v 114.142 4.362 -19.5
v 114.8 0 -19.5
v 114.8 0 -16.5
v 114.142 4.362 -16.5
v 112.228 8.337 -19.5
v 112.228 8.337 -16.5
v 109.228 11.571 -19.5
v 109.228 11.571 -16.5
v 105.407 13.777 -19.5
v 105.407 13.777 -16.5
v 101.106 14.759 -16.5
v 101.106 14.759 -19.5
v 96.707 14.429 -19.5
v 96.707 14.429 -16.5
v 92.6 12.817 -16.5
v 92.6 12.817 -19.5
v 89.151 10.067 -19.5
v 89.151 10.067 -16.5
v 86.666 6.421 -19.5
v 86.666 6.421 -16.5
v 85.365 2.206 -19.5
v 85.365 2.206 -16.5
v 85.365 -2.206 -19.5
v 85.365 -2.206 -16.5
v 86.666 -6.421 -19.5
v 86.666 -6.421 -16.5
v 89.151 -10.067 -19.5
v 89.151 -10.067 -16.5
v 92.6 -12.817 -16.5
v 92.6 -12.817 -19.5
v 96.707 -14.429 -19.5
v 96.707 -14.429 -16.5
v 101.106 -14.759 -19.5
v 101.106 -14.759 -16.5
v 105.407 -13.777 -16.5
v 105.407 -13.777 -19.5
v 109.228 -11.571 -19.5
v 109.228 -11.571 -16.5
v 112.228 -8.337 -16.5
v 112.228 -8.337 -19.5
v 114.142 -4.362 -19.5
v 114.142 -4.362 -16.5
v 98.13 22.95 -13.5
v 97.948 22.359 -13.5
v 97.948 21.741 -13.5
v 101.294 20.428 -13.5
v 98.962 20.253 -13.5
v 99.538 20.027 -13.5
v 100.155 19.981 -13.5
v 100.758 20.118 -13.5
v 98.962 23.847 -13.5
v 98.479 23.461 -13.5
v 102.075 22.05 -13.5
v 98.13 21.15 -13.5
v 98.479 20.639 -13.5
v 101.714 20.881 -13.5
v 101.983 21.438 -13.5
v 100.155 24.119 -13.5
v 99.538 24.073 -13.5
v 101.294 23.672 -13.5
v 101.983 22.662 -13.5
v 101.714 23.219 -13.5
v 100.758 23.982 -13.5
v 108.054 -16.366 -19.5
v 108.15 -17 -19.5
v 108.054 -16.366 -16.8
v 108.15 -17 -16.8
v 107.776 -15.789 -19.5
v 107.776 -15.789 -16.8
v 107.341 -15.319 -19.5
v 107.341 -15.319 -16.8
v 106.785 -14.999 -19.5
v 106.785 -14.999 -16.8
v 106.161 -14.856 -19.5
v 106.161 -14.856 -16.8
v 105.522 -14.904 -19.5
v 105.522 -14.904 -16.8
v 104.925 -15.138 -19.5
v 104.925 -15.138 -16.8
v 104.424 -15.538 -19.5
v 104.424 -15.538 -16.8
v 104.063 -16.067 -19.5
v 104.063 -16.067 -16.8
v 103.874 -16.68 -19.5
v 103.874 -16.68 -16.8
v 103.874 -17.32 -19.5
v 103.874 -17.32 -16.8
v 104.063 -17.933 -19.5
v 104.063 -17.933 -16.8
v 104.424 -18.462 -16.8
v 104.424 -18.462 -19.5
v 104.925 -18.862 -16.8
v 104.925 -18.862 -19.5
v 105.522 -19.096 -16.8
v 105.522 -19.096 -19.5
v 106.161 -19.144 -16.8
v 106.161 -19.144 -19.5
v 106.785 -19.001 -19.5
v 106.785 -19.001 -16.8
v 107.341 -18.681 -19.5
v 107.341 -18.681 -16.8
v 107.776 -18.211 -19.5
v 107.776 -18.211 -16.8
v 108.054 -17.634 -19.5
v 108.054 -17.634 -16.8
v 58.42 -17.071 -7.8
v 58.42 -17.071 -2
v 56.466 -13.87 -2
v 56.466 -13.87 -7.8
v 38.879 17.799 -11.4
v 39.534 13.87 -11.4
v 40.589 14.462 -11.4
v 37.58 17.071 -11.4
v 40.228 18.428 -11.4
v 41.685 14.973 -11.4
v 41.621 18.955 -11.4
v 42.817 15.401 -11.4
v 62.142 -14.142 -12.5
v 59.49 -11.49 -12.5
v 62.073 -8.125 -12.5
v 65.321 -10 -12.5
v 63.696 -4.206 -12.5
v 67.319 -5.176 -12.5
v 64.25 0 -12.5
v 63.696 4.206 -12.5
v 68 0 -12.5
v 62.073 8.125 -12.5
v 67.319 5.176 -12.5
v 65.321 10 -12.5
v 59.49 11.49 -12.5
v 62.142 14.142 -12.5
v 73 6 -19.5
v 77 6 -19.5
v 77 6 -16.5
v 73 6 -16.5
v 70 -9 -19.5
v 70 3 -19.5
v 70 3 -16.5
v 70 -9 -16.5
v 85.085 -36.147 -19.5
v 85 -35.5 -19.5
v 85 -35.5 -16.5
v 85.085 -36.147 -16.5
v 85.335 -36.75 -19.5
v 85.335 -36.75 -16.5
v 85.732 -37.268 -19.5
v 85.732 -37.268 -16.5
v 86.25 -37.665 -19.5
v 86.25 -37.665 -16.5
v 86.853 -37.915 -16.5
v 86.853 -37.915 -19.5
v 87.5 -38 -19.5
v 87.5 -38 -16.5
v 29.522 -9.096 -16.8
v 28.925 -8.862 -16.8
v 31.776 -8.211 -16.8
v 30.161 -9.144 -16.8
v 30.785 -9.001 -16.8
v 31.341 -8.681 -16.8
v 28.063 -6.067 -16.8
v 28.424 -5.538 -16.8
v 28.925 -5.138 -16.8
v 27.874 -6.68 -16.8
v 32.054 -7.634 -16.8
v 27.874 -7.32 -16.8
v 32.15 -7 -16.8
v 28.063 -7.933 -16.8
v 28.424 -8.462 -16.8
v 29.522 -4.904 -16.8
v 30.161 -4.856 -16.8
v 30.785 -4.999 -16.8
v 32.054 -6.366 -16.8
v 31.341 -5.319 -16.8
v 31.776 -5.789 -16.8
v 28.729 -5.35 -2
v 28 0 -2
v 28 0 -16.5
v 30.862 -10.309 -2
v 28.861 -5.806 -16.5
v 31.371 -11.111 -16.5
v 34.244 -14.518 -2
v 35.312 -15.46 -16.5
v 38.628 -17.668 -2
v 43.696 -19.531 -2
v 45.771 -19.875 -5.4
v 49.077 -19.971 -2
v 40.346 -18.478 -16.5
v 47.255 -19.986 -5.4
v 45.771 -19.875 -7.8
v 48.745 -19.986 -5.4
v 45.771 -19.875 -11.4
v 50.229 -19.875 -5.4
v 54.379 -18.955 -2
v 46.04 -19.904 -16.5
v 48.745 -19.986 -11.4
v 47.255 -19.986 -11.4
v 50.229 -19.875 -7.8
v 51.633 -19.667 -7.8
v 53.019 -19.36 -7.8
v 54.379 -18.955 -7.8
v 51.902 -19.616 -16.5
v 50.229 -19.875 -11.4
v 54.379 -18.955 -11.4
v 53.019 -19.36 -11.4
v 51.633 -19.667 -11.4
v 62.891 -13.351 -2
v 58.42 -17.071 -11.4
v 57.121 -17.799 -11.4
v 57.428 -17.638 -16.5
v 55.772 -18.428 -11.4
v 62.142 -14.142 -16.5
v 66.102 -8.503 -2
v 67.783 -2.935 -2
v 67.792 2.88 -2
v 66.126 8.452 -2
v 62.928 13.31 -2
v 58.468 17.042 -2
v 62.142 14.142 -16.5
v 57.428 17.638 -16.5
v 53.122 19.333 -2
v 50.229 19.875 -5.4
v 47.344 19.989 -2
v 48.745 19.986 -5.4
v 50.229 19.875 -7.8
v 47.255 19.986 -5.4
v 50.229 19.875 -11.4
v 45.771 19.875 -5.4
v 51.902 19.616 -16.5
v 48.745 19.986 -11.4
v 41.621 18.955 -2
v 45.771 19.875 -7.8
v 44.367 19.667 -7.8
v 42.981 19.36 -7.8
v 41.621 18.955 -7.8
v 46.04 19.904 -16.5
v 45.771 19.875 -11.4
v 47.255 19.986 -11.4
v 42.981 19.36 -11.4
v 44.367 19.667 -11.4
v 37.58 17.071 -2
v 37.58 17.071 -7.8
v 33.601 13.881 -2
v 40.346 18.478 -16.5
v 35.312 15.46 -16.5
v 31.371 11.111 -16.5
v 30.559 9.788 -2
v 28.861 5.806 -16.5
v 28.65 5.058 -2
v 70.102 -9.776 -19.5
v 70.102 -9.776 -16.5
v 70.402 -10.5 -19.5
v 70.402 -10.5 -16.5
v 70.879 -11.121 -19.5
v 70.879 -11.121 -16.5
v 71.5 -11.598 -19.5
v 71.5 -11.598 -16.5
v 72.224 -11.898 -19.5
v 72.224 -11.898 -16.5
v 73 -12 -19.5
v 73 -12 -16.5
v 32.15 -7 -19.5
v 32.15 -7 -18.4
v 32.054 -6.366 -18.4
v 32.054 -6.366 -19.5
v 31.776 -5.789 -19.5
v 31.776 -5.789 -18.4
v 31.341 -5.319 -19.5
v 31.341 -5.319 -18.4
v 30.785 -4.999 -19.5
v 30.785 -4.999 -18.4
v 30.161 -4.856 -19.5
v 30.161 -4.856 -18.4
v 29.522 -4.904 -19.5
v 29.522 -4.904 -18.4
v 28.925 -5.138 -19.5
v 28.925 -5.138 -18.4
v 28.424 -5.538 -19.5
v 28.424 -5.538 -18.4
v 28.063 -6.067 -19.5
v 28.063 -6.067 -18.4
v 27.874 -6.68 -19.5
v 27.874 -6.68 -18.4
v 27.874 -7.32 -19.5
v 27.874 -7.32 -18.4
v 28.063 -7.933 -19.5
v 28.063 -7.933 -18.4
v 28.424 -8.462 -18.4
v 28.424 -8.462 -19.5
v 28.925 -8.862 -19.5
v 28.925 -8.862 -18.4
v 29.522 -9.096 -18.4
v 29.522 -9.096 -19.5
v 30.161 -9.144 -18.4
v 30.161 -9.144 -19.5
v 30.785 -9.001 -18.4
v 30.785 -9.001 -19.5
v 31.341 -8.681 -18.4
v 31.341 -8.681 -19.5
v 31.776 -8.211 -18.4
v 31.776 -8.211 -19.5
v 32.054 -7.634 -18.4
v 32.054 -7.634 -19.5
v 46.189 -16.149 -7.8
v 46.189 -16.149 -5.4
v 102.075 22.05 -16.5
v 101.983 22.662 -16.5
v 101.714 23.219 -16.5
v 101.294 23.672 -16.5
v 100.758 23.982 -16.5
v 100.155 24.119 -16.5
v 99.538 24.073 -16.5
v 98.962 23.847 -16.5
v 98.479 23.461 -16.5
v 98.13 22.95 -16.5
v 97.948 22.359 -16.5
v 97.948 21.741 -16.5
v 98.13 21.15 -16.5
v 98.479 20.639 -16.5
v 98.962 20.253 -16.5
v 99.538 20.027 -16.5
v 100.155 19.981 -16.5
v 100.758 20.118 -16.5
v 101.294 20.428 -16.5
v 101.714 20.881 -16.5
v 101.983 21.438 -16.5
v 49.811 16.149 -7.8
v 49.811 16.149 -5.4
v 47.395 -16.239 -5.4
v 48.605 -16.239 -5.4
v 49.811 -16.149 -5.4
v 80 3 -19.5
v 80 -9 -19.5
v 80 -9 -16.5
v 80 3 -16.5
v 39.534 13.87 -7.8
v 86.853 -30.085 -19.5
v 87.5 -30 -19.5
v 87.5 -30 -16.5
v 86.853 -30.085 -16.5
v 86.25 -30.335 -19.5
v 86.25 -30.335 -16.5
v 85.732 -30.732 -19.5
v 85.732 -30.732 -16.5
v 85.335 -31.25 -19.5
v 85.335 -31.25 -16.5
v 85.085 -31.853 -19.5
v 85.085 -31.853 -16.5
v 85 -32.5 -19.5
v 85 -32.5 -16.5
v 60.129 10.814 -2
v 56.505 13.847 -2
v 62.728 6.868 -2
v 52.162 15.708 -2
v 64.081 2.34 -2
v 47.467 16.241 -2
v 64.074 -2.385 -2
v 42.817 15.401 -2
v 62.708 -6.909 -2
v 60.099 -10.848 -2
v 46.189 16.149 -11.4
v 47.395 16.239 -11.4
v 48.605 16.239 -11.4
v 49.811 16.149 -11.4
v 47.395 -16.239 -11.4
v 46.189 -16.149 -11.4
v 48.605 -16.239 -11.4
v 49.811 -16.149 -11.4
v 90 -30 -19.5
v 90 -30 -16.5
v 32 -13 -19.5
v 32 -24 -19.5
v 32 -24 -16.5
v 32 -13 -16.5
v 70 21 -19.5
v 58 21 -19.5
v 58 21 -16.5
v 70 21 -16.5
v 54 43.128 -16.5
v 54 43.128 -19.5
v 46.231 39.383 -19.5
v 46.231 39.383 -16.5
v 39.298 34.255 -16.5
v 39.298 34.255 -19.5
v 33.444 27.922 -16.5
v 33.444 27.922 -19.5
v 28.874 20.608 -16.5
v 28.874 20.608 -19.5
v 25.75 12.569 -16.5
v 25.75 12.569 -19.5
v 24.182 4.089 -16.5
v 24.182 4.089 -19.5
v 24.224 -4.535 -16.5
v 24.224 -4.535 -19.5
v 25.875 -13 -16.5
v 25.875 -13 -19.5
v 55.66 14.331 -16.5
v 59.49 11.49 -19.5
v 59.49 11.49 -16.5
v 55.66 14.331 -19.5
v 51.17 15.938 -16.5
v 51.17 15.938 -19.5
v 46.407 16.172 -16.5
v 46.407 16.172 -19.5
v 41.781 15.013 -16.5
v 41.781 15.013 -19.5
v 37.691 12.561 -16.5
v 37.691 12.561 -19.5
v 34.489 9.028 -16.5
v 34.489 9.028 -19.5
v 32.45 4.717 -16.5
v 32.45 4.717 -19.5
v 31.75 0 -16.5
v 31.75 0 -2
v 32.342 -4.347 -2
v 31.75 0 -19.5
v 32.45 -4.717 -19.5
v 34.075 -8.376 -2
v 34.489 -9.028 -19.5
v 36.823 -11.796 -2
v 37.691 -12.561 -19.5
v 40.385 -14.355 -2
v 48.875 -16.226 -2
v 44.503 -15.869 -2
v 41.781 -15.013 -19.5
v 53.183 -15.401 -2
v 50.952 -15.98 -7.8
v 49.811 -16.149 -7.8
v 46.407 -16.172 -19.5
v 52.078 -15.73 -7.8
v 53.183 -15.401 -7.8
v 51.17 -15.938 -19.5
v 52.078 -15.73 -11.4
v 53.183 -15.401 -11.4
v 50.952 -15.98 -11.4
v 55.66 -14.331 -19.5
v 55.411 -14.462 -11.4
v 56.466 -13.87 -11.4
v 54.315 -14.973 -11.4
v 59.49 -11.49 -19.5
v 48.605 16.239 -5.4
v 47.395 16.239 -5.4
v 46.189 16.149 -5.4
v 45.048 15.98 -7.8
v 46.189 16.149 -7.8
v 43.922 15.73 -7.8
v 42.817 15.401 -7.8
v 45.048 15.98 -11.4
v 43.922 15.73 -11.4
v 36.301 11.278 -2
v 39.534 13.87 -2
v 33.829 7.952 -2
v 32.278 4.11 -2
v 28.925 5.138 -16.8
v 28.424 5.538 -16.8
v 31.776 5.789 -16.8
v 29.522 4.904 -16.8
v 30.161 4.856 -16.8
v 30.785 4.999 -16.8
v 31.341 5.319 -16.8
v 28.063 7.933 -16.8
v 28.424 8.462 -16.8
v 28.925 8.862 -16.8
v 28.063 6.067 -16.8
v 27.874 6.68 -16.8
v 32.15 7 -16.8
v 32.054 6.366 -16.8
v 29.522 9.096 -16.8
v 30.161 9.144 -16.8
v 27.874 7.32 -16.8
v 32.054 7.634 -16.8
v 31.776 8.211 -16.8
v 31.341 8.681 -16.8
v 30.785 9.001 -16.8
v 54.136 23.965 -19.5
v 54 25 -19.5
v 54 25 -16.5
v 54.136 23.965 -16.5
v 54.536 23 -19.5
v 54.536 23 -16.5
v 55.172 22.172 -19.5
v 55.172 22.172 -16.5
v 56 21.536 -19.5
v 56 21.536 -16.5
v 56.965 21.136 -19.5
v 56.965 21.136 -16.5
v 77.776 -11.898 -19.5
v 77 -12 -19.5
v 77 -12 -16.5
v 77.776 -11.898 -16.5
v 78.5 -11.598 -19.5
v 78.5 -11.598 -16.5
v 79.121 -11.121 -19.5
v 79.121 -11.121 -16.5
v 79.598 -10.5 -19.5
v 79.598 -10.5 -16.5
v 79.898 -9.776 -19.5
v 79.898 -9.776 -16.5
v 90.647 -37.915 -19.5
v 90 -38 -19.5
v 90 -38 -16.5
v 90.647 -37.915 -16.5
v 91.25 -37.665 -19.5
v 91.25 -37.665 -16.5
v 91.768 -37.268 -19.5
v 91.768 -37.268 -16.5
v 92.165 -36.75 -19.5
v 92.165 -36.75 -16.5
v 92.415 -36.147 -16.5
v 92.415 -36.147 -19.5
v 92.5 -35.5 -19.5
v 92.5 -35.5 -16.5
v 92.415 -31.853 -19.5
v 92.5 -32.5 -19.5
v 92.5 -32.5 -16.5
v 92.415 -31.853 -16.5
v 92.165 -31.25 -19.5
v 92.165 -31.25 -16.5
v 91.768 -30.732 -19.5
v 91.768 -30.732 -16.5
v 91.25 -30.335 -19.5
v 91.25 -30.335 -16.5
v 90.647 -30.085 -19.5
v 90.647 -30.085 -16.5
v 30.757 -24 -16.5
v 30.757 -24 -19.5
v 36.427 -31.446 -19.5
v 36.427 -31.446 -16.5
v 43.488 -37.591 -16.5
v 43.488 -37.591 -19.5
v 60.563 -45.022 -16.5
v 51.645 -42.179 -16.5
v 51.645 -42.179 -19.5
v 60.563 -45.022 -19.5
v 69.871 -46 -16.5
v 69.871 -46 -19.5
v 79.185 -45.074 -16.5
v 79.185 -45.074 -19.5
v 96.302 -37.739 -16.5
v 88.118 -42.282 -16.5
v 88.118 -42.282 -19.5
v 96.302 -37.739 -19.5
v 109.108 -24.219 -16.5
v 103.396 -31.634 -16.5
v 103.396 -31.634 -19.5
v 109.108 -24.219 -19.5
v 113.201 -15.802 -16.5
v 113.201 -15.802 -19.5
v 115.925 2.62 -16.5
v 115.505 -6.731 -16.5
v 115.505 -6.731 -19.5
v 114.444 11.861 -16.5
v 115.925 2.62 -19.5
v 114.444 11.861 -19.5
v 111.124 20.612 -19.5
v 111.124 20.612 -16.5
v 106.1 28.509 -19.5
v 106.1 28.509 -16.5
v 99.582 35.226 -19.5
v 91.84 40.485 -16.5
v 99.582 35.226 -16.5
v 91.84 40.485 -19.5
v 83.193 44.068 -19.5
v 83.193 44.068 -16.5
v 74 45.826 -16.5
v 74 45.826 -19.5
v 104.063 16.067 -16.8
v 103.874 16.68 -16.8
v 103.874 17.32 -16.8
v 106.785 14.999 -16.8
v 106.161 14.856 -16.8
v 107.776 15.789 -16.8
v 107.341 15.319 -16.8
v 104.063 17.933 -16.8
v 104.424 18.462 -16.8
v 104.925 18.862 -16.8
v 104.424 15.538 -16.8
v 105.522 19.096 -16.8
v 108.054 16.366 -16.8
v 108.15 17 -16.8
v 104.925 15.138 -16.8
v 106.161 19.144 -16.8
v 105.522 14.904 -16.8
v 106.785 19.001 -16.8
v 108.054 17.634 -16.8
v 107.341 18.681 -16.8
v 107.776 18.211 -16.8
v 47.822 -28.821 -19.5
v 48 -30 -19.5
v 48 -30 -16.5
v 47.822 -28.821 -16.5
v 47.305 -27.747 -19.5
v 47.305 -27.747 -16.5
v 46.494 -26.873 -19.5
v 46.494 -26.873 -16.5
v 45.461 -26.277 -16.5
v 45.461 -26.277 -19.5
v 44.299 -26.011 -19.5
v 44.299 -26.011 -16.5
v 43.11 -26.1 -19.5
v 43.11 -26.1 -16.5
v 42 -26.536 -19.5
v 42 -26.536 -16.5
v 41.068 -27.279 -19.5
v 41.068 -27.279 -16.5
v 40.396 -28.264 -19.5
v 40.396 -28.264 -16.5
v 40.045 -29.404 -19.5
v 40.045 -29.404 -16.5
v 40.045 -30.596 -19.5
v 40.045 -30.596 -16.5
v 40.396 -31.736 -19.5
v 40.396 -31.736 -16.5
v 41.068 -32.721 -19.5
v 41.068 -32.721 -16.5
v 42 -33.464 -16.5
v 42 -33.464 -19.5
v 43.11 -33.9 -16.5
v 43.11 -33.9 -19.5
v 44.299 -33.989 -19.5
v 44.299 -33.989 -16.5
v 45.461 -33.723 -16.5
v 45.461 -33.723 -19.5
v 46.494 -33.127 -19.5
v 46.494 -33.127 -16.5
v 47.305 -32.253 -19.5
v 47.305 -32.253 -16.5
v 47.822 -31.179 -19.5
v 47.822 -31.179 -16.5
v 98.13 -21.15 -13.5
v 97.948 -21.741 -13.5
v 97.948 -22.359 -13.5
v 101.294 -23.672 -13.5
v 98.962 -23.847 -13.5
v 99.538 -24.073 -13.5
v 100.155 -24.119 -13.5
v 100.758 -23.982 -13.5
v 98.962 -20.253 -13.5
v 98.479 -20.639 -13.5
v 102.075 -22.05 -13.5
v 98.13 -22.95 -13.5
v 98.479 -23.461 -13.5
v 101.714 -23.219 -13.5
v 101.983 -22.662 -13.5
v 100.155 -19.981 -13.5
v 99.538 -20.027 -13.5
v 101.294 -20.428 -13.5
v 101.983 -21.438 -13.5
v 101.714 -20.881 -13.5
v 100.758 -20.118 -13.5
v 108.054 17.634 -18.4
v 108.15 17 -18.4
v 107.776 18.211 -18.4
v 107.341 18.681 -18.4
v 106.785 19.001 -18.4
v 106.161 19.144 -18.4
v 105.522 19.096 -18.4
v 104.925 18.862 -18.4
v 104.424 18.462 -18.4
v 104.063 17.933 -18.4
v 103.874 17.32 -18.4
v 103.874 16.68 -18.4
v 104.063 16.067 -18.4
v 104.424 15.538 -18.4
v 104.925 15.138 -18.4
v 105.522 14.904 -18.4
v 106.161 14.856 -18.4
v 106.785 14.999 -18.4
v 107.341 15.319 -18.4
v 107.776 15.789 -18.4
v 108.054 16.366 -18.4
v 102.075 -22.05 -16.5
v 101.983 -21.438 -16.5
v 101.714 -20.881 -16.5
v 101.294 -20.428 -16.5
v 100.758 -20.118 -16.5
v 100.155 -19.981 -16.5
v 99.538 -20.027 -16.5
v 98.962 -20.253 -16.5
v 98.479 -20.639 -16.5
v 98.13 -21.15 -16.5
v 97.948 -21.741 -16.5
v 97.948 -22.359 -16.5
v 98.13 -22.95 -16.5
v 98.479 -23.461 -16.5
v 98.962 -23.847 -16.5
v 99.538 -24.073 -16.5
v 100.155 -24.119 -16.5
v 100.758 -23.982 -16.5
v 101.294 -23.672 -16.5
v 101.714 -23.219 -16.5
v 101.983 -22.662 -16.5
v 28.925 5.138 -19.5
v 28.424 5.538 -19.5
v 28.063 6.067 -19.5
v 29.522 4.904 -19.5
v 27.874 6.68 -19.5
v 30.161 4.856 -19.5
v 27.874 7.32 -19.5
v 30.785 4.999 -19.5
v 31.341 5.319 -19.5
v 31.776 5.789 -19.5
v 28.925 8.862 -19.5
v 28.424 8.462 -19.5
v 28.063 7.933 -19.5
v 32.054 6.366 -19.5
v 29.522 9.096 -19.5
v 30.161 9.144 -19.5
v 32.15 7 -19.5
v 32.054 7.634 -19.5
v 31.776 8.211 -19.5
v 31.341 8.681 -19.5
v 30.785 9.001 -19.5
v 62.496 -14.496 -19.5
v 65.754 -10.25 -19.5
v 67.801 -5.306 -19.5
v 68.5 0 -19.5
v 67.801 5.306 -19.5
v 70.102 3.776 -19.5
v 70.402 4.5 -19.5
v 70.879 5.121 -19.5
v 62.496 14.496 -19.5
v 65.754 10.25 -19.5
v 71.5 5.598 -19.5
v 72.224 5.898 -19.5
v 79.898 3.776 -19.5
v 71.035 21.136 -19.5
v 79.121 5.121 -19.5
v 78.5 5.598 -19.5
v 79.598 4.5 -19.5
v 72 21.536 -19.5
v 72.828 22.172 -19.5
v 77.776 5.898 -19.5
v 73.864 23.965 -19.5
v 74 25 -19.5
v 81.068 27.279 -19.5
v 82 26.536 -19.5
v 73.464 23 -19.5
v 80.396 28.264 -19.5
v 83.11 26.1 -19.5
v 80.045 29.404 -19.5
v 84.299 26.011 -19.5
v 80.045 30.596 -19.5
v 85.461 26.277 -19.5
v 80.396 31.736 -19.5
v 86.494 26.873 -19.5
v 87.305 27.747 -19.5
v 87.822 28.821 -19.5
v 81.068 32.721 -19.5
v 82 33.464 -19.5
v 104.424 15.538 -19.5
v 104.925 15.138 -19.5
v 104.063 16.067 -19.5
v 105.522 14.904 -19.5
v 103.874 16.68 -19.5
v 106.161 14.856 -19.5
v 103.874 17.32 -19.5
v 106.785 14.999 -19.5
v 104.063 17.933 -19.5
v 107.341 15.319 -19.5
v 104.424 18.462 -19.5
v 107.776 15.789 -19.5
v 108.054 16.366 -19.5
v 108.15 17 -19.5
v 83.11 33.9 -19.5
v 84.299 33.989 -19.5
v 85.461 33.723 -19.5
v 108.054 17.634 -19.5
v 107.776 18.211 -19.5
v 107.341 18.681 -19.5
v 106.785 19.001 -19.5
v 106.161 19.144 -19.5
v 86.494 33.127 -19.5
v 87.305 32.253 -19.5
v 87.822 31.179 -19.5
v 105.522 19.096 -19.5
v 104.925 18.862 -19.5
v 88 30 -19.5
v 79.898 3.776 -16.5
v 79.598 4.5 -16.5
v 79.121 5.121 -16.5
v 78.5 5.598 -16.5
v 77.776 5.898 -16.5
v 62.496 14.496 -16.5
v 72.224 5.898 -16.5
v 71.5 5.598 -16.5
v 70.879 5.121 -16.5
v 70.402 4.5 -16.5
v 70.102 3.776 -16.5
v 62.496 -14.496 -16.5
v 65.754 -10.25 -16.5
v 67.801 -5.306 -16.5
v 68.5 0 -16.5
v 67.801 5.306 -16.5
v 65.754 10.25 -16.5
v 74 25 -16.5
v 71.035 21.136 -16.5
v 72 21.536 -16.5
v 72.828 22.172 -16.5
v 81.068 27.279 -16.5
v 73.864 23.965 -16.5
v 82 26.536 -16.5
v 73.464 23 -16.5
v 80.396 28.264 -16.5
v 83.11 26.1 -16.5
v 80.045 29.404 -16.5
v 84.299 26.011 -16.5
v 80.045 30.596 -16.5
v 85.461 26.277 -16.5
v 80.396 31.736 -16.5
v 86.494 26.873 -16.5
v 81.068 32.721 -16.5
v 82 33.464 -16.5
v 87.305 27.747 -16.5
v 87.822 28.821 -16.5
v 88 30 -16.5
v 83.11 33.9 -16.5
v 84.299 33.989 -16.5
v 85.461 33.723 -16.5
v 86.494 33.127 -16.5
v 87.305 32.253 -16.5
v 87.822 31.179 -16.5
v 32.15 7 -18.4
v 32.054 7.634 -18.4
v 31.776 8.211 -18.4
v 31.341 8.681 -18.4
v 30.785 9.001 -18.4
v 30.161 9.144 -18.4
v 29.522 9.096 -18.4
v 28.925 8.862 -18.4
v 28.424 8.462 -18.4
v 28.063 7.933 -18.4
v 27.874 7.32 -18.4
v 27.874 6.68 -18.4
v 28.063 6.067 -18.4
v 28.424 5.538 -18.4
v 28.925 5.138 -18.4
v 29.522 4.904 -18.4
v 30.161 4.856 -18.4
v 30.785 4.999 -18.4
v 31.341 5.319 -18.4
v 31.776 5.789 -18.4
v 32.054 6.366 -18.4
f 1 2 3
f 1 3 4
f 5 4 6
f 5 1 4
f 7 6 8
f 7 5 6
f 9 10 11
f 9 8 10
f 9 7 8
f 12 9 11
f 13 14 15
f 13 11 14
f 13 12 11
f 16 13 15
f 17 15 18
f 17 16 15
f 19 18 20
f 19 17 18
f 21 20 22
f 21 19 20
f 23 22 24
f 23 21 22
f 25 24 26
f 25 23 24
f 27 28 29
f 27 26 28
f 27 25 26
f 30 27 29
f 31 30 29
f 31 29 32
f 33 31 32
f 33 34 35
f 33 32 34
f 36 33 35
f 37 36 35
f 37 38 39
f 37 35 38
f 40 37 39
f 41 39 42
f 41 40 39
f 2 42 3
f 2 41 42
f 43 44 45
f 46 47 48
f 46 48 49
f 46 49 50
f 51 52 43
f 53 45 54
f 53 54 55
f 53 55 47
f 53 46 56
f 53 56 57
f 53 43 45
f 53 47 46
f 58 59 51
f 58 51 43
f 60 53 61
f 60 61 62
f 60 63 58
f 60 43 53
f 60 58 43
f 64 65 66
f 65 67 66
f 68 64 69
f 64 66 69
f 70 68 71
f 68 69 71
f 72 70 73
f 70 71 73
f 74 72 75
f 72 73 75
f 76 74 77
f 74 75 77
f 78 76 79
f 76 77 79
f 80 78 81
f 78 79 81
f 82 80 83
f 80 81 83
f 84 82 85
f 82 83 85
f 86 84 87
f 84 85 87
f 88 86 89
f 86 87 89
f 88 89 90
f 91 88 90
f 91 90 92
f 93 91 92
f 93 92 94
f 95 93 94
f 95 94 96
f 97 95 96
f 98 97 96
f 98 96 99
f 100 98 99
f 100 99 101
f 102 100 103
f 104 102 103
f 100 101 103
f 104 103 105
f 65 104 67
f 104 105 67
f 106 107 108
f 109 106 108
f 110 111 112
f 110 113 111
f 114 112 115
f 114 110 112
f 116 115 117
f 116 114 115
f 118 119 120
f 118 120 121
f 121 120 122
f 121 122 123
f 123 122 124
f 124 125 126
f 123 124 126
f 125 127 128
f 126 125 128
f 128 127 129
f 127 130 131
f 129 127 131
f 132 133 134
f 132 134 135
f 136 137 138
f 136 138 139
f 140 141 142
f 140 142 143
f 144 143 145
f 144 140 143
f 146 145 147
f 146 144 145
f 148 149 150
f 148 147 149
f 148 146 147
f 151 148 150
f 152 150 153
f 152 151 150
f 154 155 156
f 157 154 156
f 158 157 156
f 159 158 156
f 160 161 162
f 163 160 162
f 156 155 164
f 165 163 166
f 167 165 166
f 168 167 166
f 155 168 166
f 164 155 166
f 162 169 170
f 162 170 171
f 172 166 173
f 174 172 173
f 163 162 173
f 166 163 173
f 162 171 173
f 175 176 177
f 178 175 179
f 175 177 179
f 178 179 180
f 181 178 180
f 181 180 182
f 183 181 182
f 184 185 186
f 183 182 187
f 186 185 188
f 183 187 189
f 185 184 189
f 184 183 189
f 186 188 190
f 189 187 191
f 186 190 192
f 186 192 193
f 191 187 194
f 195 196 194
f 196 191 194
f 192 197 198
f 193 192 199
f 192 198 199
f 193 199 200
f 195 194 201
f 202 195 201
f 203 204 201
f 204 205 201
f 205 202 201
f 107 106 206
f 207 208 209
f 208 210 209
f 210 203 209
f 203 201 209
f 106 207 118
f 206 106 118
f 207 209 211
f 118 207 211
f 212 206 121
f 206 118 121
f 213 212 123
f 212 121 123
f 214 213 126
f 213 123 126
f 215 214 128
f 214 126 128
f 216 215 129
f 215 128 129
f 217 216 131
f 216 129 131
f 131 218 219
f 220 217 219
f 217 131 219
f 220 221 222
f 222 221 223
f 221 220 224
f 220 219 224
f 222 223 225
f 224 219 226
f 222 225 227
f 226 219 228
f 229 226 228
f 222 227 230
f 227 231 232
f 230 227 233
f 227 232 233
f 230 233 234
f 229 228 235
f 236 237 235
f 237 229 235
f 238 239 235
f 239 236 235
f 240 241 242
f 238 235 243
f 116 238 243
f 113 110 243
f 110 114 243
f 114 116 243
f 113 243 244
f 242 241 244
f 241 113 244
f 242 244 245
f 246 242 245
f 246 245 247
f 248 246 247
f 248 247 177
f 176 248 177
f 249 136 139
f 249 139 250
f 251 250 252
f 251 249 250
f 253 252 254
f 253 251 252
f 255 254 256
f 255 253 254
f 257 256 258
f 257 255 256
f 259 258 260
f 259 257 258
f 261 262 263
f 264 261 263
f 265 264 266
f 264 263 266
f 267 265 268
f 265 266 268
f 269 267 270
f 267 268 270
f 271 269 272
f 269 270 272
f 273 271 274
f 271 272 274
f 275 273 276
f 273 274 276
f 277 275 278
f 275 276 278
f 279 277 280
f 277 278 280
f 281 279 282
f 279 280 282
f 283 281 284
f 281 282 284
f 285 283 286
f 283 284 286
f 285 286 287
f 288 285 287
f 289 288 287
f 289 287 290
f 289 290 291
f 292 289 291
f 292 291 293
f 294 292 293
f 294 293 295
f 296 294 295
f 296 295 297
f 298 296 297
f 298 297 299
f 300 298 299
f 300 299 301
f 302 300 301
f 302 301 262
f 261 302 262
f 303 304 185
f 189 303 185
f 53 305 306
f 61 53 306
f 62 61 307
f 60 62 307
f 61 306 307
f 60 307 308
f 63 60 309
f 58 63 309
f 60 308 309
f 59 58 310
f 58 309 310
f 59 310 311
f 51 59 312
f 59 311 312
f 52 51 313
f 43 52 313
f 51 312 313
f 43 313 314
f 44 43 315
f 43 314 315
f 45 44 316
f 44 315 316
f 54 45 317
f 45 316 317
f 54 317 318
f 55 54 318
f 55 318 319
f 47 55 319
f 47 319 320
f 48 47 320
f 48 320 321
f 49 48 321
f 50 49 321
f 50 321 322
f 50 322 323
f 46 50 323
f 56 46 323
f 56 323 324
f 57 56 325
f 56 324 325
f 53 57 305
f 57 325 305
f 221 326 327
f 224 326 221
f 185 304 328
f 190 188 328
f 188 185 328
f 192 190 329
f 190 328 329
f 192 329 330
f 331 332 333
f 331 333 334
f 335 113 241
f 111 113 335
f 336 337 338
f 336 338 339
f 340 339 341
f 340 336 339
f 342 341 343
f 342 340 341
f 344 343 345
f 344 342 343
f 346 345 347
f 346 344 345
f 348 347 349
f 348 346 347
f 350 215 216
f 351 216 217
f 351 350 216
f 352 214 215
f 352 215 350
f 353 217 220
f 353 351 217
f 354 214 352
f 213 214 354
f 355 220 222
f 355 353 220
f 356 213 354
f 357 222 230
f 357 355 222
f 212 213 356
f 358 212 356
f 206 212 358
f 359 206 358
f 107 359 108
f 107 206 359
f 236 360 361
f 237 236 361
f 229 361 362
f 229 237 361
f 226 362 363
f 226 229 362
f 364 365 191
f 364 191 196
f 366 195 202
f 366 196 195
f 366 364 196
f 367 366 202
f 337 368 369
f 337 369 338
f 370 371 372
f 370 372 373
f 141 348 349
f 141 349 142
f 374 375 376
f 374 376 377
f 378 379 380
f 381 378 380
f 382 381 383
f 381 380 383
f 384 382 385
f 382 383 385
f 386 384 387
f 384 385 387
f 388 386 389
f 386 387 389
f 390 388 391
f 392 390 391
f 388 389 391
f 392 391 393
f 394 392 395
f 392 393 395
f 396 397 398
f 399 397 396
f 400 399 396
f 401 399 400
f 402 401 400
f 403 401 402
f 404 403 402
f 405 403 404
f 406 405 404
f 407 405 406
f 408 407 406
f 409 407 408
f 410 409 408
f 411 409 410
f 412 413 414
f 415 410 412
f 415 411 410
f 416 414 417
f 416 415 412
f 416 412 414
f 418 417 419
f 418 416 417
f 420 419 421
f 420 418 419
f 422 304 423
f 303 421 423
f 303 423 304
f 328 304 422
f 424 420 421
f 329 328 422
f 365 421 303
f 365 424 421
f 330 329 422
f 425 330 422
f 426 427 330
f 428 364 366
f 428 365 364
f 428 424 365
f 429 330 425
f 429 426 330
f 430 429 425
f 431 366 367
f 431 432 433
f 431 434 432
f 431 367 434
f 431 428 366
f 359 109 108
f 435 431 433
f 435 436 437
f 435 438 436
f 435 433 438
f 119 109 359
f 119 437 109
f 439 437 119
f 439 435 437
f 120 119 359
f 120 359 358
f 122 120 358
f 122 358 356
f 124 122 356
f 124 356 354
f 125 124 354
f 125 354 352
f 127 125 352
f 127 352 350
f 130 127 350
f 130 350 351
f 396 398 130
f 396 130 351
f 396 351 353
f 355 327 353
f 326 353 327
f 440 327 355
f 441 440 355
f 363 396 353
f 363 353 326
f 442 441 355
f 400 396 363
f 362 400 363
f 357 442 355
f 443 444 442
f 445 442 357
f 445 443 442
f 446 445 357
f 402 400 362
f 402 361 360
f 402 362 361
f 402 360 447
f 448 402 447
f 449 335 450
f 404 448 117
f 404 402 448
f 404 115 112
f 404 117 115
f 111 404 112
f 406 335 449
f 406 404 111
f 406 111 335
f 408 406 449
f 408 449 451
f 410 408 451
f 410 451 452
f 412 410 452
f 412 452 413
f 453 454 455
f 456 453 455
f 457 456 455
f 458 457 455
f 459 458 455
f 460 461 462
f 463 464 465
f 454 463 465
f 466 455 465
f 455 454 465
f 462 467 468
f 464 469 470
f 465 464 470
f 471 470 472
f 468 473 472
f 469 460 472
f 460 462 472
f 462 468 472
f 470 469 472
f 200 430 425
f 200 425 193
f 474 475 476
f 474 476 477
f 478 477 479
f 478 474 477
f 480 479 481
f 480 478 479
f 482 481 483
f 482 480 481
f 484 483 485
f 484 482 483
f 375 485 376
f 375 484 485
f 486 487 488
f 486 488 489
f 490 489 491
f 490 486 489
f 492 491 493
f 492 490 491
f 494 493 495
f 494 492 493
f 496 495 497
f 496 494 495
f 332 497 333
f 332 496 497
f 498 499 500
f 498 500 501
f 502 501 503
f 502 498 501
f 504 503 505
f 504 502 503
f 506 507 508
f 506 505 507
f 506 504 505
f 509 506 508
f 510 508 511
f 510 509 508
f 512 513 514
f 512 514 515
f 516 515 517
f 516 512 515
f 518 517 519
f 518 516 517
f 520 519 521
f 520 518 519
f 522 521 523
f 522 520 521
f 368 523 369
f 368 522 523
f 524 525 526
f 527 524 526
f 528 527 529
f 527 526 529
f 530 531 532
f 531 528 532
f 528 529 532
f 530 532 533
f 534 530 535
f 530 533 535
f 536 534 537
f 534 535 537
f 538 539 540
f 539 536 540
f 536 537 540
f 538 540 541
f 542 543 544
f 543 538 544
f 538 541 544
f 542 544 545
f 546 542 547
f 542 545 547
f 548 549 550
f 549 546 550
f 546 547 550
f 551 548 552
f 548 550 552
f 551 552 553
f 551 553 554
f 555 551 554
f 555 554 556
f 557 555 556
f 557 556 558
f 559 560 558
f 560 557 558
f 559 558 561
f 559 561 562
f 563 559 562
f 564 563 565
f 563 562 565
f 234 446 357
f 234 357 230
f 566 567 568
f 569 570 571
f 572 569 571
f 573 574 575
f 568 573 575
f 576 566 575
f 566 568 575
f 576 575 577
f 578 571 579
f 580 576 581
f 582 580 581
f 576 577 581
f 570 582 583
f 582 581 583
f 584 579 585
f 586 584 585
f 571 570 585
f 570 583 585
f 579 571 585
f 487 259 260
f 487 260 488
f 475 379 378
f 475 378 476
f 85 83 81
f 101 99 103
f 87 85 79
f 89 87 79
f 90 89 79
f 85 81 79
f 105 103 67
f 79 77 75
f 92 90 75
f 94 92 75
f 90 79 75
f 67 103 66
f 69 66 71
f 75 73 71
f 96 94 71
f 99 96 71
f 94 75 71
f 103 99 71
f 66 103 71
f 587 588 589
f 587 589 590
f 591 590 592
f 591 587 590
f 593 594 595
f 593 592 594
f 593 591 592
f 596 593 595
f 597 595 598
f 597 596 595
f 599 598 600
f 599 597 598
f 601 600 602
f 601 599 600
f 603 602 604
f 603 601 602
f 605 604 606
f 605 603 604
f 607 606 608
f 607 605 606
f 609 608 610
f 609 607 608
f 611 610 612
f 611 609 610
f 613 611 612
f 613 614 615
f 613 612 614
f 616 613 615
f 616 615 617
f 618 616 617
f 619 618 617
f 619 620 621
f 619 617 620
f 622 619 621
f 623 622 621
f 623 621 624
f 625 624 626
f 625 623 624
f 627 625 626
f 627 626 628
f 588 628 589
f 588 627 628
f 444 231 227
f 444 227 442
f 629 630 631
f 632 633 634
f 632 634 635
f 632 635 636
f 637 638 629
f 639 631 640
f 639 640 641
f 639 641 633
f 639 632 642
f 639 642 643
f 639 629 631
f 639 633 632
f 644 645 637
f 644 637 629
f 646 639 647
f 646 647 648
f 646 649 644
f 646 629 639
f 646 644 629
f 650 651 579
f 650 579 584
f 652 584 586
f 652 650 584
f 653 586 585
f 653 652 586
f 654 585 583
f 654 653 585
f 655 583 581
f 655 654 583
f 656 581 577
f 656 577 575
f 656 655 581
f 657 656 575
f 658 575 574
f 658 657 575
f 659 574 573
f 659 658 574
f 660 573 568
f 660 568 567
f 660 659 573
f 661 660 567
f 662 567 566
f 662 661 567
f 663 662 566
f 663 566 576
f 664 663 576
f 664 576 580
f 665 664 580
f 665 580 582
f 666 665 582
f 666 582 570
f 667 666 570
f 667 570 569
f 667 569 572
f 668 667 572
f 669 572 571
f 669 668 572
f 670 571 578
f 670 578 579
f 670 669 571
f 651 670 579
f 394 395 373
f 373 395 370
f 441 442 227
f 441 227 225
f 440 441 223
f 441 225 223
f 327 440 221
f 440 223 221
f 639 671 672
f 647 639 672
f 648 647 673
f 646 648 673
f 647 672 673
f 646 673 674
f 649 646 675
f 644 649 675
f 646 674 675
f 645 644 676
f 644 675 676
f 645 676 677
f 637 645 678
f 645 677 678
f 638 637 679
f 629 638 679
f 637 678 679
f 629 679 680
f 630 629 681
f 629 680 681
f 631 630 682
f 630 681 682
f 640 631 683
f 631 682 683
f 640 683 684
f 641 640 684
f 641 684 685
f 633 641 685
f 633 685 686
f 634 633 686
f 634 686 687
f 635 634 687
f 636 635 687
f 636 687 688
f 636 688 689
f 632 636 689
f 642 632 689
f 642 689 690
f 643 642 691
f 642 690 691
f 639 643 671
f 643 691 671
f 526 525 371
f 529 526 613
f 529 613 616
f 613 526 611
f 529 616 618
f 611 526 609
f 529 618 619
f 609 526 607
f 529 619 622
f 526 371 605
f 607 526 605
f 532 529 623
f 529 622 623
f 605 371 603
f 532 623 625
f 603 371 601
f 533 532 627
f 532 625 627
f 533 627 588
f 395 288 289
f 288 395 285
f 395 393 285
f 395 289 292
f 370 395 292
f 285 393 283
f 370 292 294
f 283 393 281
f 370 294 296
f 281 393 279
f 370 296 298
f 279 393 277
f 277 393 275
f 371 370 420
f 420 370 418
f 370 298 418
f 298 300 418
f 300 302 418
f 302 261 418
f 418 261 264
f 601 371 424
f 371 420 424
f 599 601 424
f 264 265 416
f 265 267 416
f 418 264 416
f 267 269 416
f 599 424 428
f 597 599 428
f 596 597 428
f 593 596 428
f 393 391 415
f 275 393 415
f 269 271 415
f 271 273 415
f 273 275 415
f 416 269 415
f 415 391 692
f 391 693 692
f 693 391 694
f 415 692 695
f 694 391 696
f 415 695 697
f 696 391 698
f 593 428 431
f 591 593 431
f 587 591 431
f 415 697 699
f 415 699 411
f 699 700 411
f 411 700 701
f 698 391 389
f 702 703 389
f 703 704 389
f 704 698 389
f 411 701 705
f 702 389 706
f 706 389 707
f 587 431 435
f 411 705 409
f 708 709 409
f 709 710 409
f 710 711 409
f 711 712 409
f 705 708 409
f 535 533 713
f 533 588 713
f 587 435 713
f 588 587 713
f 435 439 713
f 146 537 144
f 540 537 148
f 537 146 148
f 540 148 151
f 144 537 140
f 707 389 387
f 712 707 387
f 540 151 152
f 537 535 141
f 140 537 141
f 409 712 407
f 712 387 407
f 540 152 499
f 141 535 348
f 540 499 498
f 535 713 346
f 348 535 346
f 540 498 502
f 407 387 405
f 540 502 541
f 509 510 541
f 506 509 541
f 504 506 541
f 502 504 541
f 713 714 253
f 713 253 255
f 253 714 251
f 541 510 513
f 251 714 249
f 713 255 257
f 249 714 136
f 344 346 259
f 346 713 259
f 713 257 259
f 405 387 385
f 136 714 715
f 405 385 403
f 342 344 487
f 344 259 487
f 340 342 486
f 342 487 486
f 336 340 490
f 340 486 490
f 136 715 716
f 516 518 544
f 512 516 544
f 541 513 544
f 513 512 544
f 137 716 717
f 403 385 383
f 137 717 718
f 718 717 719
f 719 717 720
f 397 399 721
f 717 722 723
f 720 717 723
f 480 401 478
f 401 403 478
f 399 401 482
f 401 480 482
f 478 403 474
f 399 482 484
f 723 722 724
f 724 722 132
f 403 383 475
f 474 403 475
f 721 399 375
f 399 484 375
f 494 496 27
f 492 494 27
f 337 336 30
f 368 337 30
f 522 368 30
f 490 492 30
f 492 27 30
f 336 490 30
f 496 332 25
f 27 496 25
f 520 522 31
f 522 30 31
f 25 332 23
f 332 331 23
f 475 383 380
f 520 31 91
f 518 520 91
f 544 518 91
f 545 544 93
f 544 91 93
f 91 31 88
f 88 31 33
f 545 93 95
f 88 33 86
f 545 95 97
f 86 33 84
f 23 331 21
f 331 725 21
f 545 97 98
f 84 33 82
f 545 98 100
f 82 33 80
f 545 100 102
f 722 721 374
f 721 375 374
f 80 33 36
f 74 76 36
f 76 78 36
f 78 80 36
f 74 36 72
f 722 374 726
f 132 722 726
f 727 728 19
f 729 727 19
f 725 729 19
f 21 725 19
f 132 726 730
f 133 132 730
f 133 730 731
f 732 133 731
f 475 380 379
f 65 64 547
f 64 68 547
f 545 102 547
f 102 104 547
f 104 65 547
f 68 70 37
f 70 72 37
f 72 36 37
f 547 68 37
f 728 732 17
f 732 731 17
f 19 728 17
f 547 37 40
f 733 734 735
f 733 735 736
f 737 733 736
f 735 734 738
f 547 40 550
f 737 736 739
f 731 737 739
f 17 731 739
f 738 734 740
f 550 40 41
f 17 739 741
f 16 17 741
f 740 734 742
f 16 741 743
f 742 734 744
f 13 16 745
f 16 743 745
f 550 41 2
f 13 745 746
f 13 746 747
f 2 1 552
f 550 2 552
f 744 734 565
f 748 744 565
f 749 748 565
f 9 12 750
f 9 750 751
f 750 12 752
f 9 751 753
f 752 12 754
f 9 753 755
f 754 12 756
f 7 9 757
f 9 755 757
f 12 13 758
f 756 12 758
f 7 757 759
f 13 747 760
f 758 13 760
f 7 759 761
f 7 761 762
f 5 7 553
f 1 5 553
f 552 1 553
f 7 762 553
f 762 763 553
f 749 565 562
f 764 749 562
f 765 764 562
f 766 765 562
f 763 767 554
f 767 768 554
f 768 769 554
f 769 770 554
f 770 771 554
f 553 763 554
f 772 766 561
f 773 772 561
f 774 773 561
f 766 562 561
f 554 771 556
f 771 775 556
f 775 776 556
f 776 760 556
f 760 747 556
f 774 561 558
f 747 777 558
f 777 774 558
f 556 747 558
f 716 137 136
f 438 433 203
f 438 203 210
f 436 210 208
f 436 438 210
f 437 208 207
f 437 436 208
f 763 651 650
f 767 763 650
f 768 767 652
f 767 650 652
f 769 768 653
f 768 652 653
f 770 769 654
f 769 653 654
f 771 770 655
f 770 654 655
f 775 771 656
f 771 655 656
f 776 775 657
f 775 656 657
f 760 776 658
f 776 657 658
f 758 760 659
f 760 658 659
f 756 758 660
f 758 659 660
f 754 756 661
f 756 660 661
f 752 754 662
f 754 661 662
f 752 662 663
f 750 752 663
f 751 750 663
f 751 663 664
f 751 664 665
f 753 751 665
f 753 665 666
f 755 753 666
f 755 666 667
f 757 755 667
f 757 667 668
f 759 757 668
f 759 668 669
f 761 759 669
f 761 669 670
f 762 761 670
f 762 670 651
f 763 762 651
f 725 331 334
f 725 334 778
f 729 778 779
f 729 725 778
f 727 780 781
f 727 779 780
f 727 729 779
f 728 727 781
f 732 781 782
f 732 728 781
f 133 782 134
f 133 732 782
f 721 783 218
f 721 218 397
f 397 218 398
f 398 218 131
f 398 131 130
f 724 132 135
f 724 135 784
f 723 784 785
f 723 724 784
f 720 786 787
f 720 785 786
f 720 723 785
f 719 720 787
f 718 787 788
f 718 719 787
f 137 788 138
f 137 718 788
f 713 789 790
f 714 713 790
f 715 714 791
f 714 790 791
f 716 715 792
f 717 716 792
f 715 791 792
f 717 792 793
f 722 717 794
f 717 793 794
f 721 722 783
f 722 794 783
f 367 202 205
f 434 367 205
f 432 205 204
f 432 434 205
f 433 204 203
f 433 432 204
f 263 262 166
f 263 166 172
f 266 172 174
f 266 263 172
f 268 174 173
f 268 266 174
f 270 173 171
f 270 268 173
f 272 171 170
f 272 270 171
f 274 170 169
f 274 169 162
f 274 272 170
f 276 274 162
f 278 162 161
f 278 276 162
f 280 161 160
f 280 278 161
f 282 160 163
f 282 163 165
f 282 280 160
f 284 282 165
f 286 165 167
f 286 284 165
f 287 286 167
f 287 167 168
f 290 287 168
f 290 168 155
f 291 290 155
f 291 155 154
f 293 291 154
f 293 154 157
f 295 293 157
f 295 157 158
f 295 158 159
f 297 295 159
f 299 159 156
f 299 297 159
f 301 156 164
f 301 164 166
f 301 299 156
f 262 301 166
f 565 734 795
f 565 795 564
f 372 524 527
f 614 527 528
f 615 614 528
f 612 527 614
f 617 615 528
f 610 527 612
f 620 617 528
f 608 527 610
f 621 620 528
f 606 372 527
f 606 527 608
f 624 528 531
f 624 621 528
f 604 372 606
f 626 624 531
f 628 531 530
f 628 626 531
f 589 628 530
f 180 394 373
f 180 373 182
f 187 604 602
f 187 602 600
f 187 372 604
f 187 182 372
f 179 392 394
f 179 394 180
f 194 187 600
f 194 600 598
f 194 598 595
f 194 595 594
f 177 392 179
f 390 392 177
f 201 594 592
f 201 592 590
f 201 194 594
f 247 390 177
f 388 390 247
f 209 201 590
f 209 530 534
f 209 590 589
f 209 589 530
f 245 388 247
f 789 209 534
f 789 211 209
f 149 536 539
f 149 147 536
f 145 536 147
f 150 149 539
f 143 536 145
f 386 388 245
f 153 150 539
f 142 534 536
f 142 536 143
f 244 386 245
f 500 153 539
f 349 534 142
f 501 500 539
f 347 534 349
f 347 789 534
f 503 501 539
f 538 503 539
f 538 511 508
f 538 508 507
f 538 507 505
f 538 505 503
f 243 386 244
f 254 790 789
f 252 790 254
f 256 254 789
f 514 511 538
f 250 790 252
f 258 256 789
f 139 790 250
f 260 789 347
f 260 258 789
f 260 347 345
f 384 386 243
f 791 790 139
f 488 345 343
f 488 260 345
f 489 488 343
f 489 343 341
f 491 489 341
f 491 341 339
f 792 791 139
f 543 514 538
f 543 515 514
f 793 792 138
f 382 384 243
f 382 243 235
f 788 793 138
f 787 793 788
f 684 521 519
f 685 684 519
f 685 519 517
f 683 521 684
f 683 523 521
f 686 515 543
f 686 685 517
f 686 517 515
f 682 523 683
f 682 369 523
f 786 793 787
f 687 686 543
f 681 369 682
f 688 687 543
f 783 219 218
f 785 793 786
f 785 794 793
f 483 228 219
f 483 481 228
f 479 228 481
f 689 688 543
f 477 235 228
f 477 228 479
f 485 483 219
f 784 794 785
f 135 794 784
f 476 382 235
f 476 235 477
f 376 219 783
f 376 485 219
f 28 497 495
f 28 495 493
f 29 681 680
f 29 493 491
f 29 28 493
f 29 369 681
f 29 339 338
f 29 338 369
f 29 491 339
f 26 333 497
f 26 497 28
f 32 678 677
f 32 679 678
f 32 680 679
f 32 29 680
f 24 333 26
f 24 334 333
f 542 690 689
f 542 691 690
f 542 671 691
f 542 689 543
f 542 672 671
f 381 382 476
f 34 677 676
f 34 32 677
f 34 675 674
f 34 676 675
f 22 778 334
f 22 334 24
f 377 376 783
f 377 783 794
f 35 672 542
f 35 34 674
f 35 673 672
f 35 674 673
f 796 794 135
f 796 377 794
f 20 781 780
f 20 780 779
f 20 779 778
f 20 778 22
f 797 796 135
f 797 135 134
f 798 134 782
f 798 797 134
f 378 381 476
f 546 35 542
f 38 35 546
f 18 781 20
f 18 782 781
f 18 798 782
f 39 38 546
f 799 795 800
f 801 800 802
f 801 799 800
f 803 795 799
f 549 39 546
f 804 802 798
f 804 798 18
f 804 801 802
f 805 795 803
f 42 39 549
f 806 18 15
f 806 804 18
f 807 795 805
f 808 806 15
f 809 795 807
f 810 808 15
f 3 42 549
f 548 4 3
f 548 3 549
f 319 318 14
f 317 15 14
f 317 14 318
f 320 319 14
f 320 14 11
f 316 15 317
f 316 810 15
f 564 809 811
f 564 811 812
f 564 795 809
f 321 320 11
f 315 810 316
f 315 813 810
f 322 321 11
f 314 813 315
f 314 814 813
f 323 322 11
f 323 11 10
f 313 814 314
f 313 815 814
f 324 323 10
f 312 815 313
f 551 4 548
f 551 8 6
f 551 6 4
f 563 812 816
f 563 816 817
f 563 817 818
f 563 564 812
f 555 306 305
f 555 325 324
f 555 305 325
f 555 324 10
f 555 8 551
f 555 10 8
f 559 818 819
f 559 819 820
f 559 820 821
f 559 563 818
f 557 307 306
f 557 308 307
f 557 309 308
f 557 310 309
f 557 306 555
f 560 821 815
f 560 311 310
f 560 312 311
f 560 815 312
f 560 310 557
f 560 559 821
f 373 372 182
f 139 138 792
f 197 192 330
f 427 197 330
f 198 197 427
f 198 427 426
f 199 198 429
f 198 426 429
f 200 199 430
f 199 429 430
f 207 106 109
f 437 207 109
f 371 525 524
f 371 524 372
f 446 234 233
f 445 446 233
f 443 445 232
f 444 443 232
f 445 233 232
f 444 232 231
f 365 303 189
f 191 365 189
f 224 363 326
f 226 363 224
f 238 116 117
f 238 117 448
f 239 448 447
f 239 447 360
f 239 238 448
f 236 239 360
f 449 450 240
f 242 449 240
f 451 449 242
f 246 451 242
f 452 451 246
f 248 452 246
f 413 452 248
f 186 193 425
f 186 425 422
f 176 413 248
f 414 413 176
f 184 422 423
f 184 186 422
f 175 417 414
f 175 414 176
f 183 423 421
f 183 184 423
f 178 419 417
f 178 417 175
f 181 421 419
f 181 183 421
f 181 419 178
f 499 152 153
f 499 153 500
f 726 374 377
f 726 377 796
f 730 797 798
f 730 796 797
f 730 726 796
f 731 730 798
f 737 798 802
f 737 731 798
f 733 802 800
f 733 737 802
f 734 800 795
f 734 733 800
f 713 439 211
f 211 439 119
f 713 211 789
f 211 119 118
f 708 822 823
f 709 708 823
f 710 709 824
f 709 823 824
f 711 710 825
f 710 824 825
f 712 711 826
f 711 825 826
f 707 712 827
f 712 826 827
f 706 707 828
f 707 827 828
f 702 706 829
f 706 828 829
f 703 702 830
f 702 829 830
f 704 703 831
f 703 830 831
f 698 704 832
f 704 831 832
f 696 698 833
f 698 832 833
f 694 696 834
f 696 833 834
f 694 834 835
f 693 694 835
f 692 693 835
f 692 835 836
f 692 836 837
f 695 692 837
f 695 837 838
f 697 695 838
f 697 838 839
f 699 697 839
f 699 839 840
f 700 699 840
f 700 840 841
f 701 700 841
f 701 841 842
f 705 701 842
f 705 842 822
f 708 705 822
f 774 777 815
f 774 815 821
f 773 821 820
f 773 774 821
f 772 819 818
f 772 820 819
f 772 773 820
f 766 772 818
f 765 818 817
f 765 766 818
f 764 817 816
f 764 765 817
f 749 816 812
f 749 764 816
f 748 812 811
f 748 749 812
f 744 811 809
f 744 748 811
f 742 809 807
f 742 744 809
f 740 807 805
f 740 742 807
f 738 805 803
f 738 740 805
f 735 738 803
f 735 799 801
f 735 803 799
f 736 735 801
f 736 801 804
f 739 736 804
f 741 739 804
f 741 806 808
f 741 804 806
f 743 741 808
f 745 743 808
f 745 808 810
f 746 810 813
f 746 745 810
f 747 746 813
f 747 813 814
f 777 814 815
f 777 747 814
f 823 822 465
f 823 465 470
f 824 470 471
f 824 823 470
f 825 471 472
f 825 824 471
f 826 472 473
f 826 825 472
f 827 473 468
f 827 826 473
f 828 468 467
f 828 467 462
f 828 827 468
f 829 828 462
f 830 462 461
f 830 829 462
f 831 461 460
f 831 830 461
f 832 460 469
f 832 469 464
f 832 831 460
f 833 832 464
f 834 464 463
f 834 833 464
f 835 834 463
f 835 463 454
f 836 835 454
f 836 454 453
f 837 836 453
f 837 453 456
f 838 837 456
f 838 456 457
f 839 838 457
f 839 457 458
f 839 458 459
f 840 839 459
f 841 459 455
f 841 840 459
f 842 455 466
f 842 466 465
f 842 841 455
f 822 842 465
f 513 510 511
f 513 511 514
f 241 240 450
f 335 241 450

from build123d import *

# Parameters (mm, degrees)
SKETCH1_R                                           = 46
CAGE_PLATE_DEPTH                                    = 3
SKETCH2_R                                           = 20
SKETCH2_R_2                                         = 16.25
BAYONET_SOCKET_DEPTH                                = 14.5
SKETCH3_R                                           = 2.075
TURBIDITY_EAR_PINS_DEPTH                            = 3
HUB_BORE_AND_TURBIDITY_BORE_DEPTH                   = 127.008928255
HUB_BORE_AND_TURBIDITY_BORE_DEPTH_BACK              = 127.008928255
SKETCH4_R                                           = 16.25
SKETCH4_R_2                                         = 14.8
TDS_NOTCH_DS_HOLE_FLOW_WINDOW_HOSE_NOTCH_DEPTH      = 127.008928255
TDS_NOTCH_DS_HOLE_FLOW_WINDOW_HOSE_NOTCH_DEPTH_BACK = 127.008928255
SKETCH5_R                                           = 4
SKETCH5_W                                           = 12
SKETCH5_H                                           = 11
SKETCH6_R                                           = 2.15
POST_PIN_SOCKETS_BLIND_DEPTH                        = 1.6
HUB_CABLE_WINDOW_DEPTH                              = 3.75
J_ENTRY_SLOTS_DEPTH                                 = 4.95
J_TWIST_CHANNELS_DEPTH                              = 1.8
J_LOCK_NOTCHES_DEPTH                                = 3


with BuildPart() as part:
    # Sketch1 → Cage_plate (new body)
    with BuildSketch(Plane.XY.offset(-19.5)):
        with Locations((70, 0)):
            Circle(SKETCH1_R)
    extrude(amount=CAGE_PLATE_DEPTH)

    # Sketch2 → Bayonet_socket (add)
    with BuildSketch(Plane.XY.offset(-16.5)):
        with Locations(Location((48, 0, 0), (0, 0, 180))):
            Circle(SKETCH2_R)
        with Locations(Location((48, 0, 0), (0, 0, 180))):
            Circle(SKETCH2_R_2, mode=Mode.SUBTRACT)
    extrude(amount=BAYONET_SOCKET_DEPTH)

    # Sketch3 → Turbidity_ear_pins (add)
    with BuildSketch(Plane.XY.offset(-16.5)):
        with Locations((100, 22.05)):
            Circle(SKETCH3_R)
        with Locations((100, -22.05)):
            Circle(SKETCH3_R)
    extrude(amount=TURBIDITY_EAR_PINS_DEPTH)

    # Sketch4 → Hub_bore_and_turbidity_bore (cut, two sides: drawn at the far end of the back side and taken through both)
    with BuildSketch(Plane.XY.offset(-19.5).offset(-HUB_BORE_AND_TURBIDITY_BORE_DEPTH_BACK)):
        with Locations((48, 0)):
            Circle(SKETCH4_R)
        with Locations((100, 0)):
            Circle(SKETCH4_R_2)
    extrude(amount=HUB_BORE_AND_TURBIDITY_BORE_DEPTH + HUB_BORE_AND_TURBIDITY_BORE_DEPTH_BACK, mode=Mode.SUBTRACT)

    # Sketch5 → TDS_notch_DS_hole_flow_window_hose_notch (cut, two sides: drawn at the far end of the back side and taken through both)
    with BuildSketch(Plane.XY.offset(-19.5).offset(-TDS_NOTCH_DS_HOLE_FLOW_WINDOW_HOSE_NOTCH_DEPTH_BACK)):
        with Locations((84, 30)):
            Circle(SKETCH5_R)
        with Locations((44, -30)):
            Circle(SKETCH5_R)
        with BuildLine():
            Line((58, 21), (70, 21))
            ThreePointArc((70, 21), (72.828427125, 22.171572875), (74, 25))
            Line((74, 25), (74, 46))
            ThreePointArc((74, 46), (72.828427125, 48.828427125), (70, 50))
            Line((70, 50), (58, 50))
            ThreePointArc((58, 50), (55.171572875, 48.828427125), (54, 46))
            Line((54, 46), (54, 25))
            ThreePointArc((54, 25), (55.171572875, 22.171572875), (58, 21))
        make_face()
        with BuildLine():
            Line((87.5, -38), (90, -38))
            ThreePointArc((90, -38), (91.767766953, -37.267766953), (92.5, -35.5))
            Line((92.5, -35.5), (92.5, -32.5))
            ThreePointArc((92.5, -32.5), (91.767766953, -30.732233047), (90, -30))
            Line((90, -30), (87.5, -30))
            ThreePointArc((87.5, -30), (85.732233047, -30.732233047), (85, -32.5))
            Line((85, -32.5), (85, -35.5))
            ThreePointArc((85, -35.5), (85.732233047, -37.267766953), (87.5, -38))
        make_face()
        with BuildLine():
            Line((73, -12), (77, -12))
            ThreePointArc((77, -12), (79.121320344, -11.121320344), (80, -9))
            Line((80, -9), (80, 3))
            ThreePointArc((80, 3), (79.121320344, 5.121320344), (77, 6))
            Line((77, 6), (73, 6))
            ThreePointArc((73, 6), (70.878679656, 5.121320344), (70, 3))
            Line((70, 3), (70, -9))
            ThreePointArc((70, -9), (70.878679656, -11.121320344), (73, -12))
        make_face()
        with Locations((26, -18.5)):
            Rectangle(SKETCH5_W, SKETCH5_H)
    extrude(amount=TDS_NOTCH_DS_HOLE_FLOW_WINDOW_HOSE_NOTCH_DEPTH + TDS_NOTCH_DS_HOLE_FLOW_WINDOW_HOSE_NOTCH_DEPTH_BACK, mode=Mode.SUBTRACT)

    # Sketch6 → Post_pin_sockets_blind (cut, symmetric)
    with BuildSketch(Plane.XY.offset(-18.4)):
        with Locations((30, 7)):
            Circle(SKETCH6_R)
        with Locations((30, -7)):
            Circle(SKETCH6_R)
        with Locations((106, 17)):
            Circle(SKETCH6_R)
        with Locations((106, -17)):
            Circle(SKETCH6_R)
    extrude(amount=POST_PIN_SOCKETS_BLIND_DEPTH, both=True, mode=Mode.SUBTRACT)

    # Sketch7 → Hub_cable_window (cut, symmetric)
    with BuildSketch(Plane.XY.offset(-16.25)):
        with BuildLine():
            Line((59.207642482, -11.207642482), (62.495689014, -14.495689014))
            ThreePointArc((62.495689014, -14.495689014), (68.5, 0), (62.495689014, 14.495689014))
            Line((62.495689014, 14.495689014), (59.207642482, 11.207642482))
            ThreePointArc((59.207642482, 11.207642482), (63.85, 0), (59.207642482, -11.207642482))
        make_face()
    extrude(amount=HUB_CABLE_WINDOW_DEPTH, both=True, mode=Mode.SUBTRACT)

    # Sketch8 → J_entry_slots (cut, symmetric)
    with BuildSketch(Plane.XY.offset(-6.45)):
        with BuildLine():
            Line((42.928546982, 15.069517719), (41.461334159, 19.429252405))
            ThreePointArc((41.461334159, 19.429252405), (39.336325634, 18.579309634), (37.319302547, 17.497791344))
            Line((37.319302547, 17.497791344), (39.715946854, 13.571457677))
            ThreePointArc((39.715946854, 13.571457677), (41.280369638, 14.410293814), (42.928546982, 15.069517719))
        make_face()
        with BuildLine():
            Line((53.071453018, -15.069517719), (54.538665841, -19.429252405))
            ThreePointArc((54.538665841, -19.429252405), (56.663674366, -18.579309634), (58.680697453, -17.497791344))
            Line((58.680697453, -17.497791344), (56.284053146, -13.571457677))
            ThreePointArc((56.284053146, -13.571457677), (54.719630362, -14.410293814), (53.071453018, -15.069517719))
        make_face()
    extrude(amount=J_ENTRY_SLOTS_DEPTH, both=True, mode=Mode.SUBTRACT)

    # Sketch9 → J_twist_channels (cut, symmetric)
    with BuildSketch(Plane.XY.offset(-9.6)):
        with BuildLine():
            Line((49.772356022, 15.800909915), (50.28511311, 20.372242343))
            ThreePointArc((50.28511311, 20.372242343), (43.562987914, 20.014068146), (37.319302547, 17.497791344))
            Line((37.319302547, 17.497791344), (39.715946854, 13.571457677))
            ThreePointArc((39.715946854, 13.571457677), (44.558610138, 15.523106513), (49.772356022, 15.800909915))
        make_face()
        with BuildLine():
            Line((46.227643978, -15.800909915), (45.71488689, -20.372242343))
            ThreePointArc((45.71488689, -20.372242343), (52.437012086, -20.014068146), (58.680697453, -17.497791344))
            Line((58.680697453, -17.497791344), (56.284053146, -13.571457677))
            ThreePointArc((56.284053146, -13.571457677), (51.441389862, -15.523106513), (46.227643978, -15.800909915))
        make_face()
    extrude(amount=J_TWIST_CHANNELS_DEPTH, both=True, mode=Mode.SUBTRACT)

    # Sketch10 → J_lock_notches (cut, symmetric)
    with BuildSketch(Plane.XY.offset(-8.4)):
        with BuildLine():
            Line((49.772356022, 15.800909915), (50.28511311, 20.372242343))
            ThreePointArc((50.28511311, 20.372242343), (48, 20.5), (45.71488689, 20.372242343))
            Line((45.71488689, 20.372242343), (46.227643978, 15.800909915))
            ThreePointArc((46.227643978, 15.800909915), (48, 15.9), (49.772356022, 15.800909915))
        make_face()
        with BuildLine():
            Line((46.227643978, -15.800909915), (45.71488689, -20.372242343))
            ThreePointArc((45.71488689, -20.372242343), (48, -20.5), (50.28511311, -20.372242343))
            Line((50.28511311, -20.372242343), (49.772356022, -15.800909915))
            ThreePointArc((49.772356022, -15.800909915), (48, -15.9), (46.227643978, -15.800909915))
        make_face()
    extrude(amount=J_LOCK_NOTCHES_DEPTH, both=True, mode=Mode.SUBTRACT)


solid = part.part
